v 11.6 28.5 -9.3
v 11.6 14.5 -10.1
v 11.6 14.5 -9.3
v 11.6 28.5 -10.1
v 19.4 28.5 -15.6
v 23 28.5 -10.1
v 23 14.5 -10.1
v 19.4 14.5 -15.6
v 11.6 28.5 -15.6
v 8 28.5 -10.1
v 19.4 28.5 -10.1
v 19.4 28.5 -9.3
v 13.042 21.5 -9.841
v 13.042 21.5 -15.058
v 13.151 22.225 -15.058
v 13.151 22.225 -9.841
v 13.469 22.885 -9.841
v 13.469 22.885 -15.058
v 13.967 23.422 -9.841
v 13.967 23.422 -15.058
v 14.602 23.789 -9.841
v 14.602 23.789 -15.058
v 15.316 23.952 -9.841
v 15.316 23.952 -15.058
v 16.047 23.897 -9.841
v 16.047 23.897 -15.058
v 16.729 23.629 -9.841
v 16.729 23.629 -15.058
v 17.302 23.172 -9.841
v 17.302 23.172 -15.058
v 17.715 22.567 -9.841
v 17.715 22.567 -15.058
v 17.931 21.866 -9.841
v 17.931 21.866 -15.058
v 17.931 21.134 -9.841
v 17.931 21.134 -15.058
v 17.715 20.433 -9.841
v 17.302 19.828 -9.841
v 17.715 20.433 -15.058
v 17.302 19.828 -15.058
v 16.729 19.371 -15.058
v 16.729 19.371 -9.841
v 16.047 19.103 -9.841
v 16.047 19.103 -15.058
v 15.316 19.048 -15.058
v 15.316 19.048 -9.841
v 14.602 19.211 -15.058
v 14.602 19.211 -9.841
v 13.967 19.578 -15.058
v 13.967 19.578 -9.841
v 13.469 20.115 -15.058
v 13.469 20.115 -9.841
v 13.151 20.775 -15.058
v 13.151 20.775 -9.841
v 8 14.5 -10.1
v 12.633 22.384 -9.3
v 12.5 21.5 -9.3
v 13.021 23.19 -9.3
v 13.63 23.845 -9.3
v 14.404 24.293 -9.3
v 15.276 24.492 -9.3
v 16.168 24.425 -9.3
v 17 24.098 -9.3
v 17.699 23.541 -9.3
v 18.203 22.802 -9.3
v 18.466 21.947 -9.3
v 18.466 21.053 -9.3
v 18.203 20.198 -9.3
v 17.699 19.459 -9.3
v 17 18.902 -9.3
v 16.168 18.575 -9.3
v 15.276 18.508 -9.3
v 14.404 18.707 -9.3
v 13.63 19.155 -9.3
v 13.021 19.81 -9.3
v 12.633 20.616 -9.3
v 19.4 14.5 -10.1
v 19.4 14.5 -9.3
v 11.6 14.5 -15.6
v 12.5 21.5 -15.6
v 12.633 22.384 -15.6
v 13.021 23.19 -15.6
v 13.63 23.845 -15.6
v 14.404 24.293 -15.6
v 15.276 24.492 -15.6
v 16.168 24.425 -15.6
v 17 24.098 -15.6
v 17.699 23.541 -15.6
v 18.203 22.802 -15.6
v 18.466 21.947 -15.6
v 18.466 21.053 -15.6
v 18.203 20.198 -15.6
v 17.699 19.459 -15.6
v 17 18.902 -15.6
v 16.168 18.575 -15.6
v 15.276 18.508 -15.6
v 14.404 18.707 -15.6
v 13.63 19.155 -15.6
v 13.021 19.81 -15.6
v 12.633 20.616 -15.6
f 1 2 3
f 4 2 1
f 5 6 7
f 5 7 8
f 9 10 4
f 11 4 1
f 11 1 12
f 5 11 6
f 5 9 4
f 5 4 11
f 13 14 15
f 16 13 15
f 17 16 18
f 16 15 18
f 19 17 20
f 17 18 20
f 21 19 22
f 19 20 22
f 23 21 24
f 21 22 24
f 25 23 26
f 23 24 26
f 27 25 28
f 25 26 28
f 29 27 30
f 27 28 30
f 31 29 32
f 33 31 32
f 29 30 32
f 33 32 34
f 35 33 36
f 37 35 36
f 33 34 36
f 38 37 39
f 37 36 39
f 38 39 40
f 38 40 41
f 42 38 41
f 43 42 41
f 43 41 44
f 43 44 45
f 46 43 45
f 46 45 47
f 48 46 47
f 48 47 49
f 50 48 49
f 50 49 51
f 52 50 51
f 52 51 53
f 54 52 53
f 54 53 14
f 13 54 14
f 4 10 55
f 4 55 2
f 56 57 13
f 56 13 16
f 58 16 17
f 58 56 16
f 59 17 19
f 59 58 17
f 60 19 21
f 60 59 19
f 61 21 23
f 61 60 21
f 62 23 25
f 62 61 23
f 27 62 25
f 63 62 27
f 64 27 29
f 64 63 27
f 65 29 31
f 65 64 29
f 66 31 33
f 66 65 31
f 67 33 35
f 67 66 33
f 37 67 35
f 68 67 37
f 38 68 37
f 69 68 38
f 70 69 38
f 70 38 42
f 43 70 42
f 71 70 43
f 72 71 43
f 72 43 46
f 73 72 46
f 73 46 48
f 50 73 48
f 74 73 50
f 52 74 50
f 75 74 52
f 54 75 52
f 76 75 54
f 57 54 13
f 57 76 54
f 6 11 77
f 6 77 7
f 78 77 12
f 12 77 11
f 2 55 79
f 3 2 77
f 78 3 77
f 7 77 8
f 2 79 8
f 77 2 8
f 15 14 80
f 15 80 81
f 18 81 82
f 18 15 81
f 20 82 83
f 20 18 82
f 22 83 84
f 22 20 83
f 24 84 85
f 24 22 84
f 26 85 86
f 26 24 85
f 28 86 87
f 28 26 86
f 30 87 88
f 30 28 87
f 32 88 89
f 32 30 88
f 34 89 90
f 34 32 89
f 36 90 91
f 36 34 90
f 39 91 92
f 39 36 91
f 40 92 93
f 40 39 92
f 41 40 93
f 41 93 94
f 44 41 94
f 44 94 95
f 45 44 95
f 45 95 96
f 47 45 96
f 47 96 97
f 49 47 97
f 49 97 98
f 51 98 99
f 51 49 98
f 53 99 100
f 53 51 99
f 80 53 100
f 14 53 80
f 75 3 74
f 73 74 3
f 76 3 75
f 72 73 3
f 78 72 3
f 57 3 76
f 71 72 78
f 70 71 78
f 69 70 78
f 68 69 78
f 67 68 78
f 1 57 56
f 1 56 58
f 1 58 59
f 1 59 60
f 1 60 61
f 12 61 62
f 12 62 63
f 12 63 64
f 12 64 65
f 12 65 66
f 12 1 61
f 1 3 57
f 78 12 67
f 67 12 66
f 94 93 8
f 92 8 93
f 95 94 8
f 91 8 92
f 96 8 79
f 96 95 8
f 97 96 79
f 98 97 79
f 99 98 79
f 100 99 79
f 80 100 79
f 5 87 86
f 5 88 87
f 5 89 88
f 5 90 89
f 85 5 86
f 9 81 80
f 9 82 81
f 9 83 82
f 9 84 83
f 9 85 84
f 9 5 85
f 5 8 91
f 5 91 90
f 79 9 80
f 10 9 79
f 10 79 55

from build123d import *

# Parameters (mm, degrees)
EXTRUDE1_DEPTH = 14
SKETCH2_W      = 7.8
SKETCH2_H      = 14
EXTRUDE2_DEPTH = 0.8
HOLEWZD1_D     = 4.917
HOLEWZD1_DEPTH = 6.3
CHAMFER1_SIZE  = 0.5415


with BuildPart() as part:
    # Sketch1 → Extrude1 (new body)
    with BuildSketch(Plane(origin=(0, 28.5, 0), x_dir=(1, 0, 0), z_dir=(0, 1, 0))):
        Polygon((11.6, 15.6), (8, 10.1), (23, 10.1), (19.4, 15.6), align=None)
    extrude(amount=-EXTRUDE1_DEPTH)

    # Sketch2 → Extrude2 (add)
    with BuildSketch(Plane.XY.offset(-10.1)):
        with Locations((15.5, 21.5)):
            Rectangle(SKETCH2_W, SKETCH2_H)
    extrude(amount=EXTRUDE2_DEPTH)

    # HoleWzd1
    with Locations(Plane.XY.offset(-9.3)):
        with Locations((15.5, 21.5)):
            Hole(HOLEWZD1_D / 2, depth=HOLEWZD1_DEPTH)

    # Chamfer1
    chamfer1_edges = [part.edges().sort_by_distance(p)[0] for p in [
        (17.9585, 21.5, -9.3),
        (17.9585, 21.5, -15.6),
    ]]
    chamfer(chamfer1_edges, length=CHAMFER1_SIZE)


solid = part.part
